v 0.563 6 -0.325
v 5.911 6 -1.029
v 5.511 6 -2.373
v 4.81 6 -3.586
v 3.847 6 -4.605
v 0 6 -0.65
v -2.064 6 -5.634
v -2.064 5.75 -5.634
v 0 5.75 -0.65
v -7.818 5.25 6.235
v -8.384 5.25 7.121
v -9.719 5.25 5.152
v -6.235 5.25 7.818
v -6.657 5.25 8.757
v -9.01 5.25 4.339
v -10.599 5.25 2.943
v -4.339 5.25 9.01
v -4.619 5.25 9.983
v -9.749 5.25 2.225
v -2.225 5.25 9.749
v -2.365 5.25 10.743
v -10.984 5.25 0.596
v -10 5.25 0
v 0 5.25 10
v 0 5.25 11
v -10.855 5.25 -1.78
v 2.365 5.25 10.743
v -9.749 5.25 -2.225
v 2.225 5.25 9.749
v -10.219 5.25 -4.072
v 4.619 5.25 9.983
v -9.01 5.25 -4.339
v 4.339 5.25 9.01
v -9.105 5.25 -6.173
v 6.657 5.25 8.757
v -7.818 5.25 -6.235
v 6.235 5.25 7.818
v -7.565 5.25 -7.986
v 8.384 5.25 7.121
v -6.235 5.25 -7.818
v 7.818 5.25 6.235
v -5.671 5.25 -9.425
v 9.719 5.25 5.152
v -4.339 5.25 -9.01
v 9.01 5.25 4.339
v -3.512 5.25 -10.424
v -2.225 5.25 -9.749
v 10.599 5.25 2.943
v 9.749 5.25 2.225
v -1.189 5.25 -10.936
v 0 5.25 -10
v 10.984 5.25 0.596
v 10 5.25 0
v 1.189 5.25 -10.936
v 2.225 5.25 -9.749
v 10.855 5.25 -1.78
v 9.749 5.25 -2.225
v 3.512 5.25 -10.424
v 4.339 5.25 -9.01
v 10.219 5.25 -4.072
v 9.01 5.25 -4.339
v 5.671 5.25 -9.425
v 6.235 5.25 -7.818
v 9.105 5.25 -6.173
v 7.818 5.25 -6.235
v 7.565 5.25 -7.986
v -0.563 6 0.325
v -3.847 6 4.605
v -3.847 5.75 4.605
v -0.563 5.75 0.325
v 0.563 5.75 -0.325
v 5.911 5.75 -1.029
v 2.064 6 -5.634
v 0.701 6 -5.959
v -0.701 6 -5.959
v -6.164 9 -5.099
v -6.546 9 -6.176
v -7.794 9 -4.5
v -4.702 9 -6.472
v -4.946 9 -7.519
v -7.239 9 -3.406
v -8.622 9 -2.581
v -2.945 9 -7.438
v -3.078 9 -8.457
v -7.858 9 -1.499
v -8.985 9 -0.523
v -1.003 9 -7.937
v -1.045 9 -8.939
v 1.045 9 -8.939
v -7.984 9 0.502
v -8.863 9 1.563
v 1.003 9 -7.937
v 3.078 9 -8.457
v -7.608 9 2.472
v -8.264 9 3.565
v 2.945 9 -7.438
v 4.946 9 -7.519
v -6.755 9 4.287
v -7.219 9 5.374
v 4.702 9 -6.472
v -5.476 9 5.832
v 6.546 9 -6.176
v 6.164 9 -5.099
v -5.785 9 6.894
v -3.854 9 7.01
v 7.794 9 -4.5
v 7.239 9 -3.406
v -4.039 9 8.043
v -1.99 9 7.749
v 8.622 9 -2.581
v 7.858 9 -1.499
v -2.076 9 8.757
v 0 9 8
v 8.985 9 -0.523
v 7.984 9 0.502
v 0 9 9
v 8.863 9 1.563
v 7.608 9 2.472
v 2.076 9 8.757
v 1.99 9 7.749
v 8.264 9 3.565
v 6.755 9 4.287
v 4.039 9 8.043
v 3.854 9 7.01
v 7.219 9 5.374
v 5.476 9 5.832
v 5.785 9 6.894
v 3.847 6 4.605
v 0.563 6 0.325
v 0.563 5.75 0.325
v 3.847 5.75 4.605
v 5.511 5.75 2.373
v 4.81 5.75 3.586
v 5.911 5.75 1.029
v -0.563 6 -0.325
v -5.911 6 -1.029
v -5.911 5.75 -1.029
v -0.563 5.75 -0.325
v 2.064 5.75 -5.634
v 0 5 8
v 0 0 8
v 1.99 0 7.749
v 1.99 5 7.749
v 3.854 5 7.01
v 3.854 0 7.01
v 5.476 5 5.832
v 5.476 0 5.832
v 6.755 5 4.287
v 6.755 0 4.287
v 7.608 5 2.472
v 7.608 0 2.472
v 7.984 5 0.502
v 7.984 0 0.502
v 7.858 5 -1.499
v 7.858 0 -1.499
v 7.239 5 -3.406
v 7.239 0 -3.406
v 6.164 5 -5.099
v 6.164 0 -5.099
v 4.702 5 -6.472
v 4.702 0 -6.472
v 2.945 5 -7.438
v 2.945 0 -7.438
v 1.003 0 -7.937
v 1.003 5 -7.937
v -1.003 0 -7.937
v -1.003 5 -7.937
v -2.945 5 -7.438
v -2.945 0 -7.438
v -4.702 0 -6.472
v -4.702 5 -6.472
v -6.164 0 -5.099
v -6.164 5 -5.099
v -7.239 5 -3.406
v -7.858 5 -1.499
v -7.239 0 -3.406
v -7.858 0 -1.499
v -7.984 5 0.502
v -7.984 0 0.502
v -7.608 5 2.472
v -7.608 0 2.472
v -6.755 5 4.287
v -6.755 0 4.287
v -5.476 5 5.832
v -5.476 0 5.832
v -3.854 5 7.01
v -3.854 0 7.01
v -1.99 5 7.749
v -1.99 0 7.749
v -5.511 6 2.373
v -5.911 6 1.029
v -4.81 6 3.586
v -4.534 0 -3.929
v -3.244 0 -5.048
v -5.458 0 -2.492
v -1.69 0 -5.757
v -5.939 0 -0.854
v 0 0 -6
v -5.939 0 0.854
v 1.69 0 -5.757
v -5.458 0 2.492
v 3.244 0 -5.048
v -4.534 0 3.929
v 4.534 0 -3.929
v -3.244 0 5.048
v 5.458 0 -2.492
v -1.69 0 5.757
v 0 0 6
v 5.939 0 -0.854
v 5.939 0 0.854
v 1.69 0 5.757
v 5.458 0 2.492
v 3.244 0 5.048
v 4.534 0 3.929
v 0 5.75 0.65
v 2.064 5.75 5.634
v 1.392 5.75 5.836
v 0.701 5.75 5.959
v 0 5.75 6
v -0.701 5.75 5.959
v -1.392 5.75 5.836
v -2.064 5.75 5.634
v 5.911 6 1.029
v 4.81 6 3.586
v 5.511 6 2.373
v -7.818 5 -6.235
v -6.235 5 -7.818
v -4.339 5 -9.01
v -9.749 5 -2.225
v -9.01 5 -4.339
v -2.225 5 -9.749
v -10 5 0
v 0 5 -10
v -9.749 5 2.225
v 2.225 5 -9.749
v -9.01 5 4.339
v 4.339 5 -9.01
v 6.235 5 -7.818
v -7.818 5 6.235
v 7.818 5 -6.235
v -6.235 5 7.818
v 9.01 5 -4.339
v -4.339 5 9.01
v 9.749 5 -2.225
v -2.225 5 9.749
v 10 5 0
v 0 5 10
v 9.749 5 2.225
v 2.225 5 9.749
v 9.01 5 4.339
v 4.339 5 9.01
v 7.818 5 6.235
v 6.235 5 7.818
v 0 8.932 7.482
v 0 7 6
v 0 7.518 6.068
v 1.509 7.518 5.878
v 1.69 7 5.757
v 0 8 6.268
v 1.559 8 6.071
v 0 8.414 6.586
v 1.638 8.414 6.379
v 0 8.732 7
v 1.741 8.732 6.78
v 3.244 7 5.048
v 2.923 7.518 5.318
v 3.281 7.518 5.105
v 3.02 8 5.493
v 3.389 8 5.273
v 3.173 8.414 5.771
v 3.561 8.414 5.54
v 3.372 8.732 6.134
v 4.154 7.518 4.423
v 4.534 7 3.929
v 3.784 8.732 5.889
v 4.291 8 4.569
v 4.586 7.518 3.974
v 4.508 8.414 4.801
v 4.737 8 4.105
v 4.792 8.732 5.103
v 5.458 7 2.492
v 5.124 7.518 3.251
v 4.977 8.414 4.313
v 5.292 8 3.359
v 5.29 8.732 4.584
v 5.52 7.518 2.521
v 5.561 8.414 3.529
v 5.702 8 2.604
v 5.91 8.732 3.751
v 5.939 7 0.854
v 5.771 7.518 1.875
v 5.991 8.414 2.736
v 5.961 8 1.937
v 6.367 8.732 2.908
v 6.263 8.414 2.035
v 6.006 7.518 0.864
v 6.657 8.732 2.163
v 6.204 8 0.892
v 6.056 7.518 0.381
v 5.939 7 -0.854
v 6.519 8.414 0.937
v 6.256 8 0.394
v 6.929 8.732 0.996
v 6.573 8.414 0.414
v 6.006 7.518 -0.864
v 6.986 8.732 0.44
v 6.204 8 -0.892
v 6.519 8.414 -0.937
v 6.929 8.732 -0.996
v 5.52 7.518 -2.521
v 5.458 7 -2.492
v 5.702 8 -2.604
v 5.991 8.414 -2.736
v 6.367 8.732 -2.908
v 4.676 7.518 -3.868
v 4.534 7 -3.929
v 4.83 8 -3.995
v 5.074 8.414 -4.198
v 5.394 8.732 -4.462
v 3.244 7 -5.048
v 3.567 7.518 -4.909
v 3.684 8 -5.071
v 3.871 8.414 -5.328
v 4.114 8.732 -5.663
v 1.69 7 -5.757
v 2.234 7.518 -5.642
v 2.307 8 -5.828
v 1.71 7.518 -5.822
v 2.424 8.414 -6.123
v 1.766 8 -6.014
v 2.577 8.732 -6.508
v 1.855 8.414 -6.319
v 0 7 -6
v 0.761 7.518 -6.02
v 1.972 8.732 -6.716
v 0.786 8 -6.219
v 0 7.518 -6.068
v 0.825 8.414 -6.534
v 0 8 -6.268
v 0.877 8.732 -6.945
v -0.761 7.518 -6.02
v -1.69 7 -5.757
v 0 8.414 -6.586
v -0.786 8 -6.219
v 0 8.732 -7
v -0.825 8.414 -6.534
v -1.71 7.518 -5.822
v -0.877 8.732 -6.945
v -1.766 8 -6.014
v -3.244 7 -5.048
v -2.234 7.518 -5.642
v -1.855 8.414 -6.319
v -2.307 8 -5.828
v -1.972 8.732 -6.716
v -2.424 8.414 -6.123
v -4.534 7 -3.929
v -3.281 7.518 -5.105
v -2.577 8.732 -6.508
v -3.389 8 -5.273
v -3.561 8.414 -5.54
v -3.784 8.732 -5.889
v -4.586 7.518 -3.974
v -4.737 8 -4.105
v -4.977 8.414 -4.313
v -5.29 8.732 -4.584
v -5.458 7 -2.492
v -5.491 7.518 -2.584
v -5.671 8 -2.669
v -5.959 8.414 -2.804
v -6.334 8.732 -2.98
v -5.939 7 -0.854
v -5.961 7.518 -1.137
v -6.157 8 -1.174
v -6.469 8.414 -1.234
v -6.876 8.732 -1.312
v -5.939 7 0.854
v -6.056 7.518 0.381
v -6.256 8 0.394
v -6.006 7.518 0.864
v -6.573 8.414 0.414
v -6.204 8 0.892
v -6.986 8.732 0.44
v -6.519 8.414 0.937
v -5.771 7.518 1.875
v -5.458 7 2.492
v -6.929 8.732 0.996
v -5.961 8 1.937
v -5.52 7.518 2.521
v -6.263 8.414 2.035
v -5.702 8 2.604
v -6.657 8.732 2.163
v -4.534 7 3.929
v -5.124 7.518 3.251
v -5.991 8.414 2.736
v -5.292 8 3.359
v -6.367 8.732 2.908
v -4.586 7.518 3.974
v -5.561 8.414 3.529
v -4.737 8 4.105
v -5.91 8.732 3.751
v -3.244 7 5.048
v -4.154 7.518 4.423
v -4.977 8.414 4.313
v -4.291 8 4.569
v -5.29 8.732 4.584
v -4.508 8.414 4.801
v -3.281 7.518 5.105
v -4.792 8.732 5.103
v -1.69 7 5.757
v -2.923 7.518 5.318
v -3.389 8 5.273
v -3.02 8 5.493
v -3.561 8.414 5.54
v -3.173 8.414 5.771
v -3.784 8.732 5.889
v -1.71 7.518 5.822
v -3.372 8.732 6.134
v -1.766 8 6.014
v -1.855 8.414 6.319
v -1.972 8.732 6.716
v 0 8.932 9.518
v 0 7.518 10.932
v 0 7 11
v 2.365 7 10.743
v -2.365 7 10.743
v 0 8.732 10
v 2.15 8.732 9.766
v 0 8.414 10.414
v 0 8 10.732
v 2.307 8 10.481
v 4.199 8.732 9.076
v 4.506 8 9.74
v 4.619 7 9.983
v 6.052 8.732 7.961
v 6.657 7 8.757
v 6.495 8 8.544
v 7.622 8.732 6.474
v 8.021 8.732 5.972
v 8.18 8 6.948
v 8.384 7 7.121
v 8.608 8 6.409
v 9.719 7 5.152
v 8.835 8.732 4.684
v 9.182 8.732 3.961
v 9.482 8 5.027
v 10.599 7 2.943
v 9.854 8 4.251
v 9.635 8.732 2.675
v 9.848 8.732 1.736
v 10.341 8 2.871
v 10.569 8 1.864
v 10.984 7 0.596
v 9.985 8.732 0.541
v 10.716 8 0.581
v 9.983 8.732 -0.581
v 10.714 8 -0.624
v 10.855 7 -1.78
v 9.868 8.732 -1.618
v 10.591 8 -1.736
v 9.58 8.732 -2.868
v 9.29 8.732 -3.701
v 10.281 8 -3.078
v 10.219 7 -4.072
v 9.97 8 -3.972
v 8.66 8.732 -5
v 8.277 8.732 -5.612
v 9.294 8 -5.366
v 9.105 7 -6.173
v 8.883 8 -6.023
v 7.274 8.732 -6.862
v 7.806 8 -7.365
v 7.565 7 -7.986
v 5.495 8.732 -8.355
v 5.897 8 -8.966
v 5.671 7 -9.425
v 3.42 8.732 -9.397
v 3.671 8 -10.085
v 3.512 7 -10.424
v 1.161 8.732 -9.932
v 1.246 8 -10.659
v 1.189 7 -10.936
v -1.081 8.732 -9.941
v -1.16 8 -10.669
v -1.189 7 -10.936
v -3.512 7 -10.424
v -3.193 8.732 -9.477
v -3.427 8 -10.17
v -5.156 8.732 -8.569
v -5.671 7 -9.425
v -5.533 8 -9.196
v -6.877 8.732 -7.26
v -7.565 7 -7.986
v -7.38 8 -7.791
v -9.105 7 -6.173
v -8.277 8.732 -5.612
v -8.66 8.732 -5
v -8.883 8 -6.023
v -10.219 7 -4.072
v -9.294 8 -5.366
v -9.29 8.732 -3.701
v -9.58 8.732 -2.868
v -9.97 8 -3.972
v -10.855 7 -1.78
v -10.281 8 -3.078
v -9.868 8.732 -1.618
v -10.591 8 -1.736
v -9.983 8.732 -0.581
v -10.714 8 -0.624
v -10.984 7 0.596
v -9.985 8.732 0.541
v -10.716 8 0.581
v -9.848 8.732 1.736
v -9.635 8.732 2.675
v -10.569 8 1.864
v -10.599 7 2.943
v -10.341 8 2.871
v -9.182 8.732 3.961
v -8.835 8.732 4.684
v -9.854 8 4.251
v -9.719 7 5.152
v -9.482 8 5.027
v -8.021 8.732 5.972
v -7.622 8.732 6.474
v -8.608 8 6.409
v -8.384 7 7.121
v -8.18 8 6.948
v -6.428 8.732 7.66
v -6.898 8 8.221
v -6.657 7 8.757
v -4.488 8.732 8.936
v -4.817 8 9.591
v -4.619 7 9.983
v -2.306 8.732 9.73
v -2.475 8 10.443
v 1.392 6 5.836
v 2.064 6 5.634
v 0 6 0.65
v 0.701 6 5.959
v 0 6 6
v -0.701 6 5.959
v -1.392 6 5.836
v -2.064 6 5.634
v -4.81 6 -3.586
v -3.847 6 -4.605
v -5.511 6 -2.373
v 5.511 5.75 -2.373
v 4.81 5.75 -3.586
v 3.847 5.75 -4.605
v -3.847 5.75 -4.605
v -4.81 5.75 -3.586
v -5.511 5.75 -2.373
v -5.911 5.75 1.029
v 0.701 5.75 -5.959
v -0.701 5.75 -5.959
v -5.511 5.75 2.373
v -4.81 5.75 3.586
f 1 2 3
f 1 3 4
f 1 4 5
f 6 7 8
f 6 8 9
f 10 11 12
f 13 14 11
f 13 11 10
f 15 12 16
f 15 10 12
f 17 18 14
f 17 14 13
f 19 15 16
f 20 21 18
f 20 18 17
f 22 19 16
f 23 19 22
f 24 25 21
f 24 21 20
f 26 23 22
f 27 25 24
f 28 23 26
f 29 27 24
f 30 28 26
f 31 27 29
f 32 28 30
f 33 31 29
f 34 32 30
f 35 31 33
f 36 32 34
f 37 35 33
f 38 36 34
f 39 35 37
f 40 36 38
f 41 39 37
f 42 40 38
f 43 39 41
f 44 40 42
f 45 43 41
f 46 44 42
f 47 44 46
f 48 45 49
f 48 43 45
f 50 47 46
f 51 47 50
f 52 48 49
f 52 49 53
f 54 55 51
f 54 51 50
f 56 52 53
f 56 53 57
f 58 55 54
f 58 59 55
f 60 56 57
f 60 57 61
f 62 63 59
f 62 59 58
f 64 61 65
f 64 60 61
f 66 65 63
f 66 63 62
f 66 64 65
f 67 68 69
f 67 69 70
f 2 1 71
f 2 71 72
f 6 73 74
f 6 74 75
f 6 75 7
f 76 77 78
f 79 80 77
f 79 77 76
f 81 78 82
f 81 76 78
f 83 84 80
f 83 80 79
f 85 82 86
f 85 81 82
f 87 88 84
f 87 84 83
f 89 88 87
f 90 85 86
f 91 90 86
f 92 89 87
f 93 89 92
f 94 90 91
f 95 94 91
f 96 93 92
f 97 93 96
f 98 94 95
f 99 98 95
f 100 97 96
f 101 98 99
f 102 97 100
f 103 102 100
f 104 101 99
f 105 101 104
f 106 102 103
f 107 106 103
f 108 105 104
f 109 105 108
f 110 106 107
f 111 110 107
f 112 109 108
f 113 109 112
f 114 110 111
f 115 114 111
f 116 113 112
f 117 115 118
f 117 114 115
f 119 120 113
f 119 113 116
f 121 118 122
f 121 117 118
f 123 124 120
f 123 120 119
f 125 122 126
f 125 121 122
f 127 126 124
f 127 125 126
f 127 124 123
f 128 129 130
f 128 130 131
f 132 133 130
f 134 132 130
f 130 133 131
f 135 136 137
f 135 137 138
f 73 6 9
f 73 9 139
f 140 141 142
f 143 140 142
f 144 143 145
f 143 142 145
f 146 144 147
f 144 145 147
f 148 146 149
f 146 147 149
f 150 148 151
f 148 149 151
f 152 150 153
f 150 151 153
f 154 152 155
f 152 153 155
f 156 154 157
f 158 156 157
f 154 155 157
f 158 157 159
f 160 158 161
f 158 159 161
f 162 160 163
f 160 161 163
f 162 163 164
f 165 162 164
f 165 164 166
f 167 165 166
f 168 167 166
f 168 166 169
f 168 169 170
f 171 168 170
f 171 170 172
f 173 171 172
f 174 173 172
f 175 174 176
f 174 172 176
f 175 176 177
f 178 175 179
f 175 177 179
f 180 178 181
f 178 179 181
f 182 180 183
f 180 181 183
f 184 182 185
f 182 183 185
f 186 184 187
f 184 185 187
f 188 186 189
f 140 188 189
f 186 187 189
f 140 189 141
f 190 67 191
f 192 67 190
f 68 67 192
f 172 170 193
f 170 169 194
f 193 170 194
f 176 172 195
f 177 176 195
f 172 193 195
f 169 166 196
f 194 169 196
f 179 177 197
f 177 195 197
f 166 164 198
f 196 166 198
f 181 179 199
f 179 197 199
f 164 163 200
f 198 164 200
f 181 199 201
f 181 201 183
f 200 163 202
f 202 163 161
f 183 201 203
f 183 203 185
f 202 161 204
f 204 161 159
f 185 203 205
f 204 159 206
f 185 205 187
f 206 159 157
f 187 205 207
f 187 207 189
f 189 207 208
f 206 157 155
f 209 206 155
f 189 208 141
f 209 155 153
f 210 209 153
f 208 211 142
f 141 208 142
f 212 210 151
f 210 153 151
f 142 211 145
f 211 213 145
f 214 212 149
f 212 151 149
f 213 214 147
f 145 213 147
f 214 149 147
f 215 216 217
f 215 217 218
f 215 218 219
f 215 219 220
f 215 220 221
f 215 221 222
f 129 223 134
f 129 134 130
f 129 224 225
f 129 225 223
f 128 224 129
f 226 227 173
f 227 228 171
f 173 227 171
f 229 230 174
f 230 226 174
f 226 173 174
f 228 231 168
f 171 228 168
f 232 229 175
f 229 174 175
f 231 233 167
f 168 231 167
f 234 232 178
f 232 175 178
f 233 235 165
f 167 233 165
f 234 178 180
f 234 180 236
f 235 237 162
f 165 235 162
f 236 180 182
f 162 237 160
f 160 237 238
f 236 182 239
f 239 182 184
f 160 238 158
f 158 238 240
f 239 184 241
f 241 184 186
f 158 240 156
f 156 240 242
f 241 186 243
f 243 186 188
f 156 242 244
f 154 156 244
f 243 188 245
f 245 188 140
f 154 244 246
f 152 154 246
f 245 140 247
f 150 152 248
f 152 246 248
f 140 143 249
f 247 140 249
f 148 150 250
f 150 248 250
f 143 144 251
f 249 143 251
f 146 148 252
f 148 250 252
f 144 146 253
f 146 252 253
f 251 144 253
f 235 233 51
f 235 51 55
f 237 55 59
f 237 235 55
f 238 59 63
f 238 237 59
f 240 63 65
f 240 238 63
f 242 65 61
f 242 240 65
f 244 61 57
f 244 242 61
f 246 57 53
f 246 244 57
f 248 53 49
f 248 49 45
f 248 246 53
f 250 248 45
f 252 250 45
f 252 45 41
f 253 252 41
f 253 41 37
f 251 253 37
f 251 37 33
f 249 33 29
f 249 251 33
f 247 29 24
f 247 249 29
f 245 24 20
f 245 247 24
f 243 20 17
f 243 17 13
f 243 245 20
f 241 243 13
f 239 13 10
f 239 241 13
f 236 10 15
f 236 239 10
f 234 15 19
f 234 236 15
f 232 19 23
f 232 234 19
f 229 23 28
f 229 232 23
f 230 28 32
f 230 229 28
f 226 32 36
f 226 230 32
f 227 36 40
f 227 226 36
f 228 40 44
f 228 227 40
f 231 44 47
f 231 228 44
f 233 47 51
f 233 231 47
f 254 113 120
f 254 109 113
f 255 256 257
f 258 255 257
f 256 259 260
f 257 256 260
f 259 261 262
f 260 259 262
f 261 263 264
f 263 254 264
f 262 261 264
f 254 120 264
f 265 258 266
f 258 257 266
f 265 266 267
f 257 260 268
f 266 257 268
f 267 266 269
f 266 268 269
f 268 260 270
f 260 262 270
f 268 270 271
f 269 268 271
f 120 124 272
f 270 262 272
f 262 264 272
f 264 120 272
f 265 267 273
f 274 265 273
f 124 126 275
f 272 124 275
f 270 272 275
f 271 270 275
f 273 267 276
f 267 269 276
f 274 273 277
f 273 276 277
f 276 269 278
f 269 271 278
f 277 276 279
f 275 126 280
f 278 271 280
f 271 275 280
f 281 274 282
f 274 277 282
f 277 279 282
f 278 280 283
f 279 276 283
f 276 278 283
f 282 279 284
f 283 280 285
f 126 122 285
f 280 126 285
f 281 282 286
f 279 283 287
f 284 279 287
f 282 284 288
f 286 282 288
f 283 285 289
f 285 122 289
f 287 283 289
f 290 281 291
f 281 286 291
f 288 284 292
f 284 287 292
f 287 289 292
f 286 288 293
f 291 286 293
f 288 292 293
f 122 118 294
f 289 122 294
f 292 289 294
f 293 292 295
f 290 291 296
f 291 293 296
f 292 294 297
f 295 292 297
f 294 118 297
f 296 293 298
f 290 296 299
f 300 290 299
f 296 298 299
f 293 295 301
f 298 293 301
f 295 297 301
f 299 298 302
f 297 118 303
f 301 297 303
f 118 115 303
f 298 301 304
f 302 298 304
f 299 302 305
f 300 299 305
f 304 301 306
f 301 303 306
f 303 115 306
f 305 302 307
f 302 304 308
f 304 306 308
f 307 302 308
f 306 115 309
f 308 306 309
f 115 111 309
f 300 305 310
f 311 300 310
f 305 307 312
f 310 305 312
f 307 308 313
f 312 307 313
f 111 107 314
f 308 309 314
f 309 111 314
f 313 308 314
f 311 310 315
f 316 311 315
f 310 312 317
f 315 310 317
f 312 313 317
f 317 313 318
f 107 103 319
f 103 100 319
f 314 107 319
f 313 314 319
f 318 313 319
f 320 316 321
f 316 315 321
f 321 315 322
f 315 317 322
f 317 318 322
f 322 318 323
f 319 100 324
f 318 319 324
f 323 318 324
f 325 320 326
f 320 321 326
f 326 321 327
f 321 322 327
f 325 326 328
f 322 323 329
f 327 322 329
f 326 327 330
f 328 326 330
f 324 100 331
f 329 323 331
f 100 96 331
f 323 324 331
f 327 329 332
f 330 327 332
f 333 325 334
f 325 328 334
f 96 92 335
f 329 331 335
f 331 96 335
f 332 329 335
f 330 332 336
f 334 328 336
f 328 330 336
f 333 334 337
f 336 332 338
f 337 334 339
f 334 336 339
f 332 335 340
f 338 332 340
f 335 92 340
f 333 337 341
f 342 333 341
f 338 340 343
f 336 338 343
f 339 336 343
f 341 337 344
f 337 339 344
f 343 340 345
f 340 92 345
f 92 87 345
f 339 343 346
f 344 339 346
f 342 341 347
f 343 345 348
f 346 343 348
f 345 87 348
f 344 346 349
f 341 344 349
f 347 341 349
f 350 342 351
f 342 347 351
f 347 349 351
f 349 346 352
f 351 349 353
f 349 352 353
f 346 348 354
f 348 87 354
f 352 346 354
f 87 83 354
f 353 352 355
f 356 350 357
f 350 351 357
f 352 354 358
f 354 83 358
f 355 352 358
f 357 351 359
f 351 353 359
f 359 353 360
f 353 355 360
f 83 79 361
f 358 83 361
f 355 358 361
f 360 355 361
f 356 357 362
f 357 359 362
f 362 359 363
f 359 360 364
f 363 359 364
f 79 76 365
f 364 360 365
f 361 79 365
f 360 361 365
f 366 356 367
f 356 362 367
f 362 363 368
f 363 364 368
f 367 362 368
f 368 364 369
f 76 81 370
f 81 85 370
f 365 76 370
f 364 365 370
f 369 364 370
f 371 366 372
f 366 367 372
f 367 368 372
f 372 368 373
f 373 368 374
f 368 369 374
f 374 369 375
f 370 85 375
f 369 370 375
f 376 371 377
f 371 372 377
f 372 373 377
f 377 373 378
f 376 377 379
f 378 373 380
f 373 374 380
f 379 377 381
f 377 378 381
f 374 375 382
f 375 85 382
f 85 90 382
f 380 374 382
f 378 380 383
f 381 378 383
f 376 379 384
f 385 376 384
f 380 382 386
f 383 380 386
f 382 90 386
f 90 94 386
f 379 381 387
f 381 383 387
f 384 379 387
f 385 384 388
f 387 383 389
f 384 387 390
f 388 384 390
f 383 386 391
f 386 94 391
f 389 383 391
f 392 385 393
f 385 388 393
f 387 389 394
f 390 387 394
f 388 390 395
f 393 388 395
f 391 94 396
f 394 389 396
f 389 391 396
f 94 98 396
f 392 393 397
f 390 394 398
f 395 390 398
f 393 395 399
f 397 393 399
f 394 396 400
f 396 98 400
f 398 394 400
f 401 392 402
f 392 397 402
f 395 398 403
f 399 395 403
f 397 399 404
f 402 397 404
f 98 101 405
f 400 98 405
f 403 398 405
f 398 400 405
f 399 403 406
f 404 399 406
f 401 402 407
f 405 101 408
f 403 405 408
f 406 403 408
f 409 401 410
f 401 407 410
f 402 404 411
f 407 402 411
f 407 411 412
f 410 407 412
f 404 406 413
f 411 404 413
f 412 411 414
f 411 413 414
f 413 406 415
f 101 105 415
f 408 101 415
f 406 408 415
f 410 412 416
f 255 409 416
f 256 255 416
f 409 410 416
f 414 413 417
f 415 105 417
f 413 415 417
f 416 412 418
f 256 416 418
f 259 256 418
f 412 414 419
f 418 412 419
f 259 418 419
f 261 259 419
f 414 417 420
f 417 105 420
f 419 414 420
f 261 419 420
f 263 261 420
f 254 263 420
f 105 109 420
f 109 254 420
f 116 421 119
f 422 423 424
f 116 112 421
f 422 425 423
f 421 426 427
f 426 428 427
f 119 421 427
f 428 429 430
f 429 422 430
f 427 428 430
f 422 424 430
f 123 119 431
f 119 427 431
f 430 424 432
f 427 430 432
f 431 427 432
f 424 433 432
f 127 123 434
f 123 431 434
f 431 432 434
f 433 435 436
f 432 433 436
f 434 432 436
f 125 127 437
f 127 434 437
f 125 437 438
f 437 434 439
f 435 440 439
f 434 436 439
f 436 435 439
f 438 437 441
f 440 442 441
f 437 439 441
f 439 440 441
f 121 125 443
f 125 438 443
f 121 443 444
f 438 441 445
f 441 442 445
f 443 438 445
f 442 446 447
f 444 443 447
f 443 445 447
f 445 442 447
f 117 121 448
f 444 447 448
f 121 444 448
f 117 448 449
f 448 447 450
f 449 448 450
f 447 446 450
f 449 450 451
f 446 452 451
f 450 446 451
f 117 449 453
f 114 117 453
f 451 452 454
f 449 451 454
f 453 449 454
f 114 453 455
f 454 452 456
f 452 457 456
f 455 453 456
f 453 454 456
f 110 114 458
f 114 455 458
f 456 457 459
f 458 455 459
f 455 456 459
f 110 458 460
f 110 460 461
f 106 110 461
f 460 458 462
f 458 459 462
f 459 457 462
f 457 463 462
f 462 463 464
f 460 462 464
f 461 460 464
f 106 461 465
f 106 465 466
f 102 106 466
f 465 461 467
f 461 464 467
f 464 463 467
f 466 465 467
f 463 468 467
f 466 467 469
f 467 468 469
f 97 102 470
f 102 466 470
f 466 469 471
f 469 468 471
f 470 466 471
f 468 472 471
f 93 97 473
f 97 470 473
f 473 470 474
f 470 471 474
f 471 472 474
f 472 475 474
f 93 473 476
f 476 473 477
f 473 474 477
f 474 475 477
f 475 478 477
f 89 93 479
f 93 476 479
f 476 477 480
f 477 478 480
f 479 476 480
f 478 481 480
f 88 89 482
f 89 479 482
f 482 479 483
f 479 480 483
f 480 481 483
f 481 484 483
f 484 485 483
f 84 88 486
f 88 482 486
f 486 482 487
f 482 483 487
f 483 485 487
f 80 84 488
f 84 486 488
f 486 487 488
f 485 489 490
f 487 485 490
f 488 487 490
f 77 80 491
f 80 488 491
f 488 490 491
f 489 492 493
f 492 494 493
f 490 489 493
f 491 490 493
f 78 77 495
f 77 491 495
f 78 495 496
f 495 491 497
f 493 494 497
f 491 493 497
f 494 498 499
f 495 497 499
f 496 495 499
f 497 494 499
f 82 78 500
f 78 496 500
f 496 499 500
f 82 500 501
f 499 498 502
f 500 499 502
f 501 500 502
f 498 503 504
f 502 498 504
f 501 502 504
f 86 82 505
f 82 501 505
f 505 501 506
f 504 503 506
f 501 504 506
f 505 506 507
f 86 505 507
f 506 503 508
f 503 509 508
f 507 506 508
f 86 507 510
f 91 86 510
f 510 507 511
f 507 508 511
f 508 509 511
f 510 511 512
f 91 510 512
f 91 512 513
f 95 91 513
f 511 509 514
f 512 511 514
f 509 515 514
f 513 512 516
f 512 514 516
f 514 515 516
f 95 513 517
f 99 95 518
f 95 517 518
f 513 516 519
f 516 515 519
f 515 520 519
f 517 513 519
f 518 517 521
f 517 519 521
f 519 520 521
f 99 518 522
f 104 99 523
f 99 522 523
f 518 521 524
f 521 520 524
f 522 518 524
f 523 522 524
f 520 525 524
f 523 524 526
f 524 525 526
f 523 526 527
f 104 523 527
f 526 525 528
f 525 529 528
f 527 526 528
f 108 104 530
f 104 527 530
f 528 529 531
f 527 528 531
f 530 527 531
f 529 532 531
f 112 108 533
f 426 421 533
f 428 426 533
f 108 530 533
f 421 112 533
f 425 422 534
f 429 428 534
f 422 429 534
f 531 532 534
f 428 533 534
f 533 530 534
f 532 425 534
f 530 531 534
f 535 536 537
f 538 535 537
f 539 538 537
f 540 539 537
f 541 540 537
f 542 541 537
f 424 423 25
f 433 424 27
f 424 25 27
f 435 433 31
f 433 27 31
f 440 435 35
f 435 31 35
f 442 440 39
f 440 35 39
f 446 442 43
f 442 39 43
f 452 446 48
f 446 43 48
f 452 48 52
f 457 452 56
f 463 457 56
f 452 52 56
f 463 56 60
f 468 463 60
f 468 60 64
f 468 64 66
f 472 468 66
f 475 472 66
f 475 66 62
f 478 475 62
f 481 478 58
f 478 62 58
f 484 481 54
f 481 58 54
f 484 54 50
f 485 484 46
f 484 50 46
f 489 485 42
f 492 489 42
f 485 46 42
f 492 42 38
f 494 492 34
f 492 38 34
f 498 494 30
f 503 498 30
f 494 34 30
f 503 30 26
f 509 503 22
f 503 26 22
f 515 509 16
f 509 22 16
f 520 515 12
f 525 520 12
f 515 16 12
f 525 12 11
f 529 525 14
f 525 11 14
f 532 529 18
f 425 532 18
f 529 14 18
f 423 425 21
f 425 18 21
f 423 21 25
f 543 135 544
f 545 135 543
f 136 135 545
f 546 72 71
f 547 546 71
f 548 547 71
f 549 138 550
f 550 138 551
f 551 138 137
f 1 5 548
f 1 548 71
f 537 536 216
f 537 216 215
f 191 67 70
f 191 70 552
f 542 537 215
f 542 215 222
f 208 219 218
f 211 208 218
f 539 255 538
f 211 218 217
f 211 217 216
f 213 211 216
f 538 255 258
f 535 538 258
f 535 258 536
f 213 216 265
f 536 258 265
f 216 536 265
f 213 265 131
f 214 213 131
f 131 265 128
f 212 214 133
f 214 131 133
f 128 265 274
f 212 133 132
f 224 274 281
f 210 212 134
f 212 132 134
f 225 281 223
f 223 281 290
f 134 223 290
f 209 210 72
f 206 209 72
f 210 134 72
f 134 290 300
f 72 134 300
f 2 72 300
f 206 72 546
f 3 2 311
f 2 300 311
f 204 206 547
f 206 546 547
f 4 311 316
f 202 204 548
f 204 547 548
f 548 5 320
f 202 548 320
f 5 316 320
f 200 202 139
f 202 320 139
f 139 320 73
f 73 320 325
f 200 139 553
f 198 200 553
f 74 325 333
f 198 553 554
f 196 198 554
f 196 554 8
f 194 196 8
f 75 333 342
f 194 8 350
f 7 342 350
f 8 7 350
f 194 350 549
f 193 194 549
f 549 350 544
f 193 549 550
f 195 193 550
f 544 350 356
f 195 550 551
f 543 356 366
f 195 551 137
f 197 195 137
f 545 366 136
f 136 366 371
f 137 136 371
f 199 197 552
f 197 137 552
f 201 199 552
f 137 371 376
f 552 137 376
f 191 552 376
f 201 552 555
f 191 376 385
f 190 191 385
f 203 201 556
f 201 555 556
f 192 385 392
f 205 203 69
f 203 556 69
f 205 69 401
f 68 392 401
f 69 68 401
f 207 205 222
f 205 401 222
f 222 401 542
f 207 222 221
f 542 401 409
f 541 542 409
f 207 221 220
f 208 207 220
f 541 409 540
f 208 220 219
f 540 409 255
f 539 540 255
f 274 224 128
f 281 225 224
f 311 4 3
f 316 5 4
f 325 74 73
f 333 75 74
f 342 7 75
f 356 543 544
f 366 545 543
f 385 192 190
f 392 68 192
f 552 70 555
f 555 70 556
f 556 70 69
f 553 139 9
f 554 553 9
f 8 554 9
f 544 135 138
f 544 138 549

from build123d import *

# Parameters (mm, degrees)
SKETCH1_R           = 8
BOSS_EXTRUDE1_DEPTH = 5
SKETCH2_R           = 11
BOSS_EXTRUDE2_DEPTH = 4
SKETCH3_R           = 6
CUT_EXTRUDE1_DEPTH  = 18.972200756
BOSS_EXTRUDE3_START = -6
BOSS_EXTRUDE3_DEPTH = 0.25
SKETCH5_R           = 11
SKETCH5_R_2         = 10
CUT_EXTRUDE2_DEPTH  = 0.25
FILLET1_R           = 2


with BuildPart() as part:
    # Sketch1 → Boss-Extrude1 (new body)
    with BuildSketch(Plane(origin=(0, 0, 0), x_dir=(1, 0, 0), z_dir=(0, 1, 0))):
        with Locations(Location((0, 0, 0), (0, 0, 270))):
            Circle(SKETCH1_R)
    extrude(amount=BOSS_EXTRUDE1_DEPTH)

    # Sketch2 → Boss-Extrude2 (add)
    with BuildSketch(Plane(origin=(0, 5, 0), x_dir=(1, 0, 0), z_dir=(0, 1, 0))):
        with Locations(Location((0, 0, 0), (0, 0, 270))):
            Circle(SKETCH2_R)
    extrude(amount=BOSS_EXTRUDE2_DEPTH)

    # Sketch3 → Cut-Extrude1 (cut, through all)
    with BuildSketch(Plane(origin=(0, 9, 0), x_dir=(1, 0, 0), z_dir=(0, 1, 0))):
        with Locations(Location((0, 0, 0), (0, 0, 270))):
            Circle(SKETCH3_R)
    extrude(amount=-CUT_EXTRUDE1_DEPTH, mode=Mode.SUBTRACT)

    # Sketch4 → Boss-Extrude3 (add)
    with BuildSketch(Plane.XZ.offset(BOSS_EXTRUDE3_START)):
        with BuildLine():
            Line((0, 0.65), (-2.064316872, 5.633701789))
            ThreePointArc((-2.064316872, 5.633701789), (0, 6), (2.064316872, 5.633701789))
            Line((2.064316872, 5.633701789), (0, 0.65))
        make_face()
        with BuildLine():
            Line((0.562916512, 0.325), (3.846770431, 4.604601747))
            ThreePointArc((3.846770431, 4.604601747), (5.196152423, 3), (5.911087303, 1.029100042))
            Line((5.911087303, 1.029100042), (0.562916512, 0.325))
        make_face()
        with BuildLine():
            Line((0.562916512, -0.325), (5.911087303, -1.029100042))
            ThreePointArc((5.911087303, -1.029100042), (5.196152423, -3), (3.846770431, -4.604601747))
            Line((3.846770431, -4.604601747), (0.562916512, -0.325))
        make_face()
        with BuildLine():
            Line((0, -0.65), (2.064316872, -5.633701789))
            ThreePointArc((2.064316872, -5.633701789), (0, -6), (-2.064316872, -5.633701789))
            Line((-2.064316872, -5.633701789), (0, -0.65))
        make_face()
        with BuildLine():
            Line((-0.562916512, -0.325), (-3.846770431, -4.604601747))
            ThreePointArc((-3.846770431, -4.604601747), (-5.196152423, -3), (-5.911087303, -1.029100042))
            Line((-5.911087303, -1.029100042), (-0.562916512, -0.325))
        make_face()
        with BuildLine():
            Line((-0.562916512, 0.325), (-5.911087303, 1.029100042))
            ThreePointArc((-5.911087303, 1.029100042), (-5.196152423, 3), (-3.846770431, 4.604601747))
            Line((-3.846770431, 4.604601747), (-0.562916512, 0.325))
        make_face()
    extrude(amount=BOSS_EXTRUDE3_DEPTH)

    # Sketch5 → Cut-Extrude2 (cut)
    with BuildSketch(Plane.XZ.offset(-5)):
        with Locations(Location((0, 0, 0), (0, 0, 270))):
            Circle(SKETCH5_R)
        with Locations(Location((0, 0, 0), (0, 0, 270))):
            Circle(SKETCH5_R_2, mode=Mode.SUBTRACT)
    extrude(amount=-CUT_EXTRUDE2_DEPTH, mode=Mode.SUBTRACT)

    # Fillet1
    fillet1_edges = [part.edges().sort_by_distance(p)[0] for p in [
        (0, 9, -6),
        (0, 9, -11),
    ]]
    fillet(fillet1_edges, radius=FILLET1_R)


solid = part.part
